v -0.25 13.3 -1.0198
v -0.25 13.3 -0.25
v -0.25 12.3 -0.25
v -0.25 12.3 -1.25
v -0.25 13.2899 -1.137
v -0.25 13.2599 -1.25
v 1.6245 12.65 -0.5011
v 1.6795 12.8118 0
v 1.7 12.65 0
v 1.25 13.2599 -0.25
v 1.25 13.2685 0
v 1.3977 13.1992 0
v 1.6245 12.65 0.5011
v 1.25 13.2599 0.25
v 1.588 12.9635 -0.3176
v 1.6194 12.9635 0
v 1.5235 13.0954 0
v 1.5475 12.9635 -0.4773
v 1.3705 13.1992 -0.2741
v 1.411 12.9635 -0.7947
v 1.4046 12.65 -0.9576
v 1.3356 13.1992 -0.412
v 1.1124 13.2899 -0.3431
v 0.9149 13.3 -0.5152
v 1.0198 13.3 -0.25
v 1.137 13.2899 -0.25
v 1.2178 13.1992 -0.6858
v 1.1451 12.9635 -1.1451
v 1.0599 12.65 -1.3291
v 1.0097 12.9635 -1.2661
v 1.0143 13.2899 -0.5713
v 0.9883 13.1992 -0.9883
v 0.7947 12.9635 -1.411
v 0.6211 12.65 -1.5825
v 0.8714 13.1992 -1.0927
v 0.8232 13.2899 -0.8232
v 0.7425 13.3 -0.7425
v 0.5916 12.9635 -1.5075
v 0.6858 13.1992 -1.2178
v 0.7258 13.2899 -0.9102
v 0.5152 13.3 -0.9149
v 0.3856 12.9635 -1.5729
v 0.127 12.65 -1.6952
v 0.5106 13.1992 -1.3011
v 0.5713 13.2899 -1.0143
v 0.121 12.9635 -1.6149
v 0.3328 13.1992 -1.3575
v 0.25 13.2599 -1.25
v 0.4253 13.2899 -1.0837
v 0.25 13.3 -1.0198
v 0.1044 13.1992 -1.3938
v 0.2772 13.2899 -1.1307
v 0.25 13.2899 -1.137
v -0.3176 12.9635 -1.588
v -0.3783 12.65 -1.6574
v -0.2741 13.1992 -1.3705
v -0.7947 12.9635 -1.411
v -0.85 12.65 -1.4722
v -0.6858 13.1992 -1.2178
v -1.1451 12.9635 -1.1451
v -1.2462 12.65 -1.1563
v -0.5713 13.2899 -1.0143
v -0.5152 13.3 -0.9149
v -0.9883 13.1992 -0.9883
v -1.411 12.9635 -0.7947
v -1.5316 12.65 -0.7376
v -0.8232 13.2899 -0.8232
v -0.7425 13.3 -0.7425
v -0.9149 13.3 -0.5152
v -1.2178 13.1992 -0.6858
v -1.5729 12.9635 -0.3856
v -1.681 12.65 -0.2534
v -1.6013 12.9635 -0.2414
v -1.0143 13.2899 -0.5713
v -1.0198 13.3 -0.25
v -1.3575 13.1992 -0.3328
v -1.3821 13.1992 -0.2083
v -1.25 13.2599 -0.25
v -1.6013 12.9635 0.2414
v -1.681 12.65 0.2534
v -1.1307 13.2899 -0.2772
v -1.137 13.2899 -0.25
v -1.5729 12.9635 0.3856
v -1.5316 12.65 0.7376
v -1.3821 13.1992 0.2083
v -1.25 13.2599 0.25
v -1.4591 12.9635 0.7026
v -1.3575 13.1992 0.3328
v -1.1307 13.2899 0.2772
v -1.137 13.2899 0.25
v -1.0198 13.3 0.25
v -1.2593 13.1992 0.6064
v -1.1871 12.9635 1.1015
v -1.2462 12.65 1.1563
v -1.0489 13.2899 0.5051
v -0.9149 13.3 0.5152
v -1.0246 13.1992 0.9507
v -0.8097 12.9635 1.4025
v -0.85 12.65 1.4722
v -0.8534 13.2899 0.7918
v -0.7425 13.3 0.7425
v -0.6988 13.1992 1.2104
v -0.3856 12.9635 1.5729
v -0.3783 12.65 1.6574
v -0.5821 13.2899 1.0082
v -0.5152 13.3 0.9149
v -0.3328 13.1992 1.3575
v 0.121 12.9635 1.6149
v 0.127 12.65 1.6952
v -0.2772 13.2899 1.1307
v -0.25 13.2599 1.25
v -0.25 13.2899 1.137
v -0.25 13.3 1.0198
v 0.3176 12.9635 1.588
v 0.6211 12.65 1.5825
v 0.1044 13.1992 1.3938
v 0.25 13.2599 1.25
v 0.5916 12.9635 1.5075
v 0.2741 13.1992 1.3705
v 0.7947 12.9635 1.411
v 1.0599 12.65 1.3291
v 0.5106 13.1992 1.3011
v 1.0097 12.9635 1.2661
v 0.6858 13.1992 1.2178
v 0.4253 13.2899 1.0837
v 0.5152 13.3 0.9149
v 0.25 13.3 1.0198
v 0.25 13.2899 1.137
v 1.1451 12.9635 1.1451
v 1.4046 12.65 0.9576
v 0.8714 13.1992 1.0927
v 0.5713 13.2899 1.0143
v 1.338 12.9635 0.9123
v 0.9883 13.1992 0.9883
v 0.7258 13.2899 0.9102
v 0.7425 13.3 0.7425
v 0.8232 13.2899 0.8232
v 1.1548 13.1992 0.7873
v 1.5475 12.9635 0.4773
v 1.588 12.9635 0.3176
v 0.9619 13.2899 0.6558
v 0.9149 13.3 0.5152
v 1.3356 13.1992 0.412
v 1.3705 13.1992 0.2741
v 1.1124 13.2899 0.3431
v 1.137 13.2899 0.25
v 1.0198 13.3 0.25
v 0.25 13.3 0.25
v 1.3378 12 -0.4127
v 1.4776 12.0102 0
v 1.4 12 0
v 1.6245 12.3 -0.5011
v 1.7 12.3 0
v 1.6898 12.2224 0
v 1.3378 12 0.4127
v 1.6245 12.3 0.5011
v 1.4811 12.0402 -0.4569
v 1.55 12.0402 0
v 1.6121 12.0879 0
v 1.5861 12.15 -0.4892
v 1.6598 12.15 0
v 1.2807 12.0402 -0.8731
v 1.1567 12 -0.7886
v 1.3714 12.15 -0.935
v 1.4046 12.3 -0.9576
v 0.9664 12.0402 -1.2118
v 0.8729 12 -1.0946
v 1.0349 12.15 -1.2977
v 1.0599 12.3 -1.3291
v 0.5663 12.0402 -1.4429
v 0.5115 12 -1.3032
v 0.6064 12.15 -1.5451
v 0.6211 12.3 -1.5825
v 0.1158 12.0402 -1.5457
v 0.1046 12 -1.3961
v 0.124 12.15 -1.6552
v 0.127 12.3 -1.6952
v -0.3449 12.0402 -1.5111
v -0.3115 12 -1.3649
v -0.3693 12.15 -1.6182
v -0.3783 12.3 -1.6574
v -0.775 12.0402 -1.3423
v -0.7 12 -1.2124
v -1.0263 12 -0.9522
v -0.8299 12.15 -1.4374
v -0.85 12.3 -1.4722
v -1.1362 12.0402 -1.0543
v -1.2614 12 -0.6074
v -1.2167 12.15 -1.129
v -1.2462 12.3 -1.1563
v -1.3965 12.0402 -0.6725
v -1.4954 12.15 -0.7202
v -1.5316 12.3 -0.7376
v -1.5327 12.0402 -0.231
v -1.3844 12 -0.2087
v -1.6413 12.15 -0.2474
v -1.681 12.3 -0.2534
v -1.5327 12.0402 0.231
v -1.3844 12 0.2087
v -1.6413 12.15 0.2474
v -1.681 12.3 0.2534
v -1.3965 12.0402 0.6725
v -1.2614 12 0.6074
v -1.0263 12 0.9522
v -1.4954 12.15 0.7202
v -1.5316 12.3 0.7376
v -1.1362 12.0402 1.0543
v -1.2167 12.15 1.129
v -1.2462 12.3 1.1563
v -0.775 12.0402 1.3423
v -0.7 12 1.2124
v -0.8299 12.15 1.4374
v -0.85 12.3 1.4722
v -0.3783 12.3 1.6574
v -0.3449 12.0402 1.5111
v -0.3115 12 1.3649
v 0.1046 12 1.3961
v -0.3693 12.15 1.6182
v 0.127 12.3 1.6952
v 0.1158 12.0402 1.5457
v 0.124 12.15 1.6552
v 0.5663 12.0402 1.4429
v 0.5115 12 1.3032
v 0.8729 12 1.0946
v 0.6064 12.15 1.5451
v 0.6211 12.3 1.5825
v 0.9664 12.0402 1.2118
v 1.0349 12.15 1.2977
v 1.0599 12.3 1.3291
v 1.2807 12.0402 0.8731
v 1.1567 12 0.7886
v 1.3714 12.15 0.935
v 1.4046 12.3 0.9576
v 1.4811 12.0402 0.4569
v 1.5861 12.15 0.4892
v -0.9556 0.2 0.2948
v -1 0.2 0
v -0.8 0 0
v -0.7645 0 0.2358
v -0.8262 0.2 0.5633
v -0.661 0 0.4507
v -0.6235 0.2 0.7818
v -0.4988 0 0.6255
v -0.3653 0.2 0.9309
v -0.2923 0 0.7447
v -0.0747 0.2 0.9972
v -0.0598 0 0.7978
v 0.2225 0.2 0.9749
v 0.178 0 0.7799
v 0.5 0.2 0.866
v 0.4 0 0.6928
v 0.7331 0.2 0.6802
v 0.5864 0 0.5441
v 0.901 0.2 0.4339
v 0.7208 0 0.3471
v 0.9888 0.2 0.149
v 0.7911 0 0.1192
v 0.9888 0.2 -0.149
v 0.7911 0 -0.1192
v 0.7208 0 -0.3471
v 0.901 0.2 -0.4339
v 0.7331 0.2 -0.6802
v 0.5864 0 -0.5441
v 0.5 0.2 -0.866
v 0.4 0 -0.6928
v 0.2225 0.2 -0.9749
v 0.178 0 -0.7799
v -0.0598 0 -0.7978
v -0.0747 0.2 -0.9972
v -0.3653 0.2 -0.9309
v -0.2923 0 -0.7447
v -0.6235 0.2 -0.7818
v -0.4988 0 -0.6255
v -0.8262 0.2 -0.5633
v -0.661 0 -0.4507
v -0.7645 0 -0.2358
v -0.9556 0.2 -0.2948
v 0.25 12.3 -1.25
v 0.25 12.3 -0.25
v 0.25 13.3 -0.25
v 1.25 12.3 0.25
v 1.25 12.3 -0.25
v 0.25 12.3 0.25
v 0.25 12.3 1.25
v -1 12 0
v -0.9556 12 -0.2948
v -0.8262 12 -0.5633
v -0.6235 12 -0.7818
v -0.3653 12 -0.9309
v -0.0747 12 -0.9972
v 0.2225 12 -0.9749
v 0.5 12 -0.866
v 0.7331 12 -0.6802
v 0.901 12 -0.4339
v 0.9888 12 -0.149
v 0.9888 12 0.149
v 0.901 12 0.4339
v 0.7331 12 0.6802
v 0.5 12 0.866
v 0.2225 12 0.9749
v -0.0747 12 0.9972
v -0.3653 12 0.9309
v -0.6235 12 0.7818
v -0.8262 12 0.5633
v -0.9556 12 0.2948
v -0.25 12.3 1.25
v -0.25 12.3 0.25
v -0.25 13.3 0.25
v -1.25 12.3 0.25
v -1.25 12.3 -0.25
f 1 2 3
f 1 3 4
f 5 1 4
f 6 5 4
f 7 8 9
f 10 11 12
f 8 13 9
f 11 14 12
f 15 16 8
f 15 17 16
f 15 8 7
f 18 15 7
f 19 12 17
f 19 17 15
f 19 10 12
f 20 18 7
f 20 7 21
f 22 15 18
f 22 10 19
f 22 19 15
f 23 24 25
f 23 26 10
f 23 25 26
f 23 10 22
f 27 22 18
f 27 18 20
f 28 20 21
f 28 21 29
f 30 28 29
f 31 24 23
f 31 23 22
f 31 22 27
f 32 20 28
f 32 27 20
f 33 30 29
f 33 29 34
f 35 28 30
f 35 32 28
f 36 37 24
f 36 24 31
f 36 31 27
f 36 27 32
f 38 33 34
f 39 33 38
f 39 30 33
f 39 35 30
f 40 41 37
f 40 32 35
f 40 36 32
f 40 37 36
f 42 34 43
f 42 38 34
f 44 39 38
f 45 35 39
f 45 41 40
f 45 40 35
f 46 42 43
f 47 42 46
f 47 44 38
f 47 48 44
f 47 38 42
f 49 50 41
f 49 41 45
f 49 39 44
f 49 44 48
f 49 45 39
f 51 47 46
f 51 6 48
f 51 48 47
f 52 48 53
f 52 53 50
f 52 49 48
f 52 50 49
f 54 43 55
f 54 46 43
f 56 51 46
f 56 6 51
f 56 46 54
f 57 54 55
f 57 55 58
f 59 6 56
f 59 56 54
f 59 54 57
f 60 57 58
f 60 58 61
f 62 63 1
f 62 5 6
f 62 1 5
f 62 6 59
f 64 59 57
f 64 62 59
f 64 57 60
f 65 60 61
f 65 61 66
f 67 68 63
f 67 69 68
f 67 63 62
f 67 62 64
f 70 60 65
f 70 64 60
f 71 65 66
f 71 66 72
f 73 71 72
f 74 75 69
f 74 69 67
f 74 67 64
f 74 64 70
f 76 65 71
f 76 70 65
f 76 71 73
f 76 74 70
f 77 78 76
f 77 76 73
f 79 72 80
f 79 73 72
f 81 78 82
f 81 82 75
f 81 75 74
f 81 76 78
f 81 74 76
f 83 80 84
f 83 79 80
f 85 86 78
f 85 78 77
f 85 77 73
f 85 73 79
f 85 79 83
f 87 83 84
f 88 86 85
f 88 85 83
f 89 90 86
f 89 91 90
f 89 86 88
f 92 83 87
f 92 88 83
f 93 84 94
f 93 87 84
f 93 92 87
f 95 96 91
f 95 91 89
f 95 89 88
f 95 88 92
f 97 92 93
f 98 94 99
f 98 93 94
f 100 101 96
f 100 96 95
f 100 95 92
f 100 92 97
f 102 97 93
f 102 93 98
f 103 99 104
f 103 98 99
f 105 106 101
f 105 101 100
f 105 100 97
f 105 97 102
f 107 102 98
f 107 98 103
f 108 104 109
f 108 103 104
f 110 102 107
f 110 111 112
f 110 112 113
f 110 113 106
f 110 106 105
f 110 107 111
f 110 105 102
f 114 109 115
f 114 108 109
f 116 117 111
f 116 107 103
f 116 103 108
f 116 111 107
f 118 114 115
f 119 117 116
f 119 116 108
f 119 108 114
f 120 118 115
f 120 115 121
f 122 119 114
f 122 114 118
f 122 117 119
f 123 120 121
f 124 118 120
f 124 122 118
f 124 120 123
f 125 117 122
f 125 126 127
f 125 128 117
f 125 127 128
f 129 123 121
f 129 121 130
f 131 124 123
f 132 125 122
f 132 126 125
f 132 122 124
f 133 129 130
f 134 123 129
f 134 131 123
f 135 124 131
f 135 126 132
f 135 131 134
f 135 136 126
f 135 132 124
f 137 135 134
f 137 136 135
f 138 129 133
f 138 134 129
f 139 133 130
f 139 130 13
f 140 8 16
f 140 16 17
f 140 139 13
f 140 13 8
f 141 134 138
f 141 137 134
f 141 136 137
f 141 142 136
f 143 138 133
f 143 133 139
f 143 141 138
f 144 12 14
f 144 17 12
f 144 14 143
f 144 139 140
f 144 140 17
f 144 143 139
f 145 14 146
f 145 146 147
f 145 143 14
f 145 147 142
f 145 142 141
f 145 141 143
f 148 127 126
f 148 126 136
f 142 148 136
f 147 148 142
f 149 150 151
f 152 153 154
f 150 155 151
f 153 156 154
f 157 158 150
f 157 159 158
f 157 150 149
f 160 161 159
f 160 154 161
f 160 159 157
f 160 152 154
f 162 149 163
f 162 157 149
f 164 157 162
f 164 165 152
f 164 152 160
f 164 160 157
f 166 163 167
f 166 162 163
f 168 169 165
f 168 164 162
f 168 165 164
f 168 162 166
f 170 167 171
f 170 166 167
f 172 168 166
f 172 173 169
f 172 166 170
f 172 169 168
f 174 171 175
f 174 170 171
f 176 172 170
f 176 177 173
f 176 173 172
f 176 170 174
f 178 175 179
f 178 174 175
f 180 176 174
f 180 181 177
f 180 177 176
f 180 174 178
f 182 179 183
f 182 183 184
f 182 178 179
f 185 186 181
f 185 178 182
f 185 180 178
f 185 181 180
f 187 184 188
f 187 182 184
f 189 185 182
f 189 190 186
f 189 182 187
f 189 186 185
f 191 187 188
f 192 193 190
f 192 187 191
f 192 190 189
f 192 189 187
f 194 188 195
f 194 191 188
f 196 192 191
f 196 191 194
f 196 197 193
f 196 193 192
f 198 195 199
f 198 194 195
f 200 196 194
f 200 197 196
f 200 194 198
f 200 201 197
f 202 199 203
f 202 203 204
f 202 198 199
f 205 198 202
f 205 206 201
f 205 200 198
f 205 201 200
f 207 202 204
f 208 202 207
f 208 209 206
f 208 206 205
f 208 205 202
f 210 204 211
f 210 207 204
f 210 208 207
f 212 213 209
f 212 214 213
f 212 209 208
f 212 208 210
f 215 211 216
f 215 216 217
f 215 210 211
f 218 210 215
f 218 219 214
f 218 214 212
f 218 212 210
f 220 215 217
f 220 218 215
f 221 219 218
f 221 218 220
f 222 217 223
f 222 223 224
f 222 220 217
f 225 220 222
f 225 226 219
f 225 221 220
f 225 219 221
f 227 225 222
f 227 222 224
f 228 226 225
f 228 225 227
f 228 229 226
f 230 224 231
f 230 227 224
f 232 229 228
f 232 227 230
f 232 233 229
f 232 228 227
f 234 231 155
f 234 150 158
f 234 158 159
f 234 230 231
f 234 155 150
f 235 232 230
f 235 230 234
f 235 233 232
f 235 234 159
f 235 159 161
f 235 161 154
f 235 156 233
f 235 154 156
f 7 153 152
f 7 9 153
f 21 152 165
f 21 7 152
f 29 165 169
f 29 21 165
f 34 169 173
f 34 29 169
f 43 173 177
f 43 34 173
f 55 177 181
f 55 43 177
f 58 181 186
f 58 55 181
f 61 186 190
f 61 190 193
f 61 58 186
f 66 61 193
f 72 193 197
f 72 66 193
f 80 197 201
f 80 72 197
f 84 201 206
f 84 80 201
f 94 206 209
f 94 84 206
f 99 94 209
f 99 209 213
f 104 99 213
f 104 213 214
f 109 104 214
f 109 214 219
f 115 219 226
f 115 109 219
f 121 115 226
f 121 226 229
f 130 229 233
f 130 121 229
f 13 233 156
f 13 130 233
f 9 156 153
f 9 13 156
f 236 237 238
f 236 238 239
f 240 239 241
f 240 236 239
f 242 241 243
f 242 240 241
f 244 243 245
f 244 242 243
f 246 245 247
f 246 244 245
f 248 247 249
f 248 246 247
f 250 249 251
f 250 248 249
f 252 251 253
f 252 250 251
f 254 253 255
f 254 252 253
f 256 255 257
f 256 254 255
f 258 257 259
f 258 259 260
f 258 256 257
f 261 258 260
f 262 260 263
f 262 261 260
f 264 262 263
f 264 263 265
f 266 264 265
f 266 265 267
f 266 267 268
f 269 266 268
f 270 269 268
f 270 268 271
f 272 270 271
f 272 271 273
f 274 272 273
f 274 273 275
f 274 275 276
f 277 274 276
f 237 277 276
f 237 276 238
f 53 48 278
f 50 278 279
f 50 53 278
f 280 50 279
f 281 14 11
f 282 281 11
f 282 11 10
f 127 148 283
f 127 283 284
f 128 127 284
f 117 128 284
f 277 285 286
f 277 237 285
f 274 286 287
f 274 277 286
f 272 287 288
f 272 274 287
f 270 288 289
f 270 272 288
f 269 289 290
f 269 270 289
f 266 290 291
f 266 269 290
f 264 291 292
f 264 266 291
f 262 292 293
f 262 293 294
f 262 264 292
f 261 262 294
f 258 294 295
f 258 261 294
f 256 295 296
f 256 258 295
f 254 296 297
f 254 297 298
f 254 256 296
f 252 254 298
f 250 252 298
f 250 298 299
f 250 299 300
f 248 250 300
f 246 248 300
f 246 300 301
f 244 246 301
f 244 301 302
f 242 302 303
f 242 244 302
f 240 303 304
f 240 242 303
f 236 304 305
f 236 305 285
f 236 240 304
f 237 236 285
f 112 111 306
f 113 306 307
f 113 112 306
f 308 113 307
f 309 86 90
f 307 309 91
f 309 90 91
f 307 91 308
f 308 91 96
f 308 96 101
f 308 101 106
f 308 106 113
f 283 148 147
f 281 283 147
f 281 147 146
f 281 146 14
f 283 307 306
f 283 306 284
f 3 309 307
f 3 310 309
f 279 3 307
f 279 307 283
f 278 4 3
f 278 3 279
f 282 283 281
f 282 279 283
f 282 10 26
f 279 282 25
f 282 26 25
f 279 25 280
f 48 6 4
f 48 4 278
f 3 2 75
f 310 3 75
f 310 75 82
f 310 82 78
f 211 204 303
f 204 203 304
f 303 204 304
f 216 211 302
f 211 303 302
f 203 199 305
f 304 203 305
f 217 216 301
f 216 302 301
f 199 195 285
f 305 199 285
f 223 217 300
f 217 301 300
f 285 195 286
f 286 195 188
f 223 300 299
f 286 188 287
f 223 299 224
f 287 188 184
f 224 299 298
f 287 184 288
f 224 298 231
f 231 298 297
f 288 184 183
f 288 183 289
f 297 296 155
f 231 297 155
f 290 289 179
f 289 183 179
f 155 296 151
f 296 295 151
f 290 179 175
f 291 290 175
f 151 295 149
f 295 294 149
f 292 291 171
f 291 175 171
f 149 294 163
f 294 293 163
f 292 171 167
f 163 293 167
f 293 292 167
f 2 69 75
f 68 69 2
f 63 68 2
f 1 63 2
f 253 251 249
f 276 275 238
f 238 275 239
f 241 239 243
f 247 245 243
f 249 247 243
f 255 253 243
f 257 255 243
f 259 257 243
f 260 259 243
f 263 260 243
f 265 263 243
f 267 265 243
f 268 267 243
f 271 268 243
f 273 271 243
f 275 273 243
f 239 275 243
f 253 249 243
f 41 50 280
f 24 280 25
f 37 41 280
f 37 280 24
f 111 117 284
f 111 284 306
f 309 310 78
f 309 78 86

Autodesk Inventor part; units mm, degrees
ref_plane "YZ Plane" through (0, 0, 0) normal (1, 0, 0) x (0, 1, 0)
ref_plane "XZ Plane" through (0, 0, 0) normal (0, 1, 0) x (-1, 0, 0)
ref_plane "XY Plane" through (0, 0, 0) normal (0, 0, 1) x (1, 0, 0)
sketch "Sketch1" plane through (0, 0, 0) normal (0, 1, 0) x (-1, 0, 0)
  circle A0 centre (0, 0) radius 1
  dimension "d0" = 2
extrude "Extrusion1" add sketch "Sketch1" along normal blind 13.3
sketch "Sketch2" plane through (0, 13.3, 0) normal (0, 1, 0) x (1, 0, 0)
  circle A0 centre (0, 0) radius 1 projected
  circle A1 centre (0, 0) radius 1.7
  dimension "d3" = 3.4
extrude "Extrusion2" add sketch "Sketch2" against normal blind 1.3 contours A0 | A1
thread "Thread1" size "M2x0.4" class "6g" standard "ANSI Metric M Profile" full length
sketch "Sketch3" plane through (0, 13.3, 0) normal (0, 1, 0) x (1, 0, 0)
  line L0 (-1.25, -0.25) -> (1.25, -0.25)
  line L1 (1.25, -0.25) -> (1.25, 0.25)
  line L2 (1.25, 0.25) -> (-1.25, 0.25)
  line L3 (-1.25, 0.25) -> (-1.25, -0.25)
  line L4 (-1.25, -0.25) -> (1.25, 0.25) construction
  line L5 (1.25, -0.25) -> (-1.25, 0.25) construction
  line L6 (-0.25, 1.25) -> (0.25, 1.25)
  line L7 (0.25, 1.25) -> (0.25, -1.25)
  line L8 (0.25, -1.25) -> (-0.25, -1.25)
  line L9 (-0.25, -1.25) -> (-0.25, 1.25)
  circle A0 centre (0, 0) radius 1 projected
  line L10 (-0.25, 1.25) -> (0.25, -1.25) construction
  line L11 (0.25, 1.25) -> (-0.25, -1.25) construction
  point P0 (-0.25, -0.25)
  point P1 (0.25, -0.25)
  point P2 (0.25, 0.25)
  point P3 (-0.25, 0.25)
  dimension "d8" = 2.5
  dimension "d9" = 0.5
  dimension "d10" = 0.5
  dimension "d11" = 2.5
extrude "Extrusion3" cut sketch "Sketch3" against normal blind 1 contours L3 L2 A0 L0 | A0 L2 L9 L0 | L9 L2 L7 L0 | L0 L7 A0 L9 | A0 L7 L8 L9 | L7 L2 A0 L0 | L9 A0 L7 L2 | L9 L6 L7 A0 | A0 L2 L1 L0
chamfer "Chamfer1" distance 0.2 angle 45 1 edges at (1, 0, 0)
fillet "Fillet1" radius 0.65 1 edges at (-1.7, 13.3, 0)
fillet "Fillet2" radius 0.3 1 edges at (-1.7, 12, 0)
properties part number "M2_Short_Bolt"
